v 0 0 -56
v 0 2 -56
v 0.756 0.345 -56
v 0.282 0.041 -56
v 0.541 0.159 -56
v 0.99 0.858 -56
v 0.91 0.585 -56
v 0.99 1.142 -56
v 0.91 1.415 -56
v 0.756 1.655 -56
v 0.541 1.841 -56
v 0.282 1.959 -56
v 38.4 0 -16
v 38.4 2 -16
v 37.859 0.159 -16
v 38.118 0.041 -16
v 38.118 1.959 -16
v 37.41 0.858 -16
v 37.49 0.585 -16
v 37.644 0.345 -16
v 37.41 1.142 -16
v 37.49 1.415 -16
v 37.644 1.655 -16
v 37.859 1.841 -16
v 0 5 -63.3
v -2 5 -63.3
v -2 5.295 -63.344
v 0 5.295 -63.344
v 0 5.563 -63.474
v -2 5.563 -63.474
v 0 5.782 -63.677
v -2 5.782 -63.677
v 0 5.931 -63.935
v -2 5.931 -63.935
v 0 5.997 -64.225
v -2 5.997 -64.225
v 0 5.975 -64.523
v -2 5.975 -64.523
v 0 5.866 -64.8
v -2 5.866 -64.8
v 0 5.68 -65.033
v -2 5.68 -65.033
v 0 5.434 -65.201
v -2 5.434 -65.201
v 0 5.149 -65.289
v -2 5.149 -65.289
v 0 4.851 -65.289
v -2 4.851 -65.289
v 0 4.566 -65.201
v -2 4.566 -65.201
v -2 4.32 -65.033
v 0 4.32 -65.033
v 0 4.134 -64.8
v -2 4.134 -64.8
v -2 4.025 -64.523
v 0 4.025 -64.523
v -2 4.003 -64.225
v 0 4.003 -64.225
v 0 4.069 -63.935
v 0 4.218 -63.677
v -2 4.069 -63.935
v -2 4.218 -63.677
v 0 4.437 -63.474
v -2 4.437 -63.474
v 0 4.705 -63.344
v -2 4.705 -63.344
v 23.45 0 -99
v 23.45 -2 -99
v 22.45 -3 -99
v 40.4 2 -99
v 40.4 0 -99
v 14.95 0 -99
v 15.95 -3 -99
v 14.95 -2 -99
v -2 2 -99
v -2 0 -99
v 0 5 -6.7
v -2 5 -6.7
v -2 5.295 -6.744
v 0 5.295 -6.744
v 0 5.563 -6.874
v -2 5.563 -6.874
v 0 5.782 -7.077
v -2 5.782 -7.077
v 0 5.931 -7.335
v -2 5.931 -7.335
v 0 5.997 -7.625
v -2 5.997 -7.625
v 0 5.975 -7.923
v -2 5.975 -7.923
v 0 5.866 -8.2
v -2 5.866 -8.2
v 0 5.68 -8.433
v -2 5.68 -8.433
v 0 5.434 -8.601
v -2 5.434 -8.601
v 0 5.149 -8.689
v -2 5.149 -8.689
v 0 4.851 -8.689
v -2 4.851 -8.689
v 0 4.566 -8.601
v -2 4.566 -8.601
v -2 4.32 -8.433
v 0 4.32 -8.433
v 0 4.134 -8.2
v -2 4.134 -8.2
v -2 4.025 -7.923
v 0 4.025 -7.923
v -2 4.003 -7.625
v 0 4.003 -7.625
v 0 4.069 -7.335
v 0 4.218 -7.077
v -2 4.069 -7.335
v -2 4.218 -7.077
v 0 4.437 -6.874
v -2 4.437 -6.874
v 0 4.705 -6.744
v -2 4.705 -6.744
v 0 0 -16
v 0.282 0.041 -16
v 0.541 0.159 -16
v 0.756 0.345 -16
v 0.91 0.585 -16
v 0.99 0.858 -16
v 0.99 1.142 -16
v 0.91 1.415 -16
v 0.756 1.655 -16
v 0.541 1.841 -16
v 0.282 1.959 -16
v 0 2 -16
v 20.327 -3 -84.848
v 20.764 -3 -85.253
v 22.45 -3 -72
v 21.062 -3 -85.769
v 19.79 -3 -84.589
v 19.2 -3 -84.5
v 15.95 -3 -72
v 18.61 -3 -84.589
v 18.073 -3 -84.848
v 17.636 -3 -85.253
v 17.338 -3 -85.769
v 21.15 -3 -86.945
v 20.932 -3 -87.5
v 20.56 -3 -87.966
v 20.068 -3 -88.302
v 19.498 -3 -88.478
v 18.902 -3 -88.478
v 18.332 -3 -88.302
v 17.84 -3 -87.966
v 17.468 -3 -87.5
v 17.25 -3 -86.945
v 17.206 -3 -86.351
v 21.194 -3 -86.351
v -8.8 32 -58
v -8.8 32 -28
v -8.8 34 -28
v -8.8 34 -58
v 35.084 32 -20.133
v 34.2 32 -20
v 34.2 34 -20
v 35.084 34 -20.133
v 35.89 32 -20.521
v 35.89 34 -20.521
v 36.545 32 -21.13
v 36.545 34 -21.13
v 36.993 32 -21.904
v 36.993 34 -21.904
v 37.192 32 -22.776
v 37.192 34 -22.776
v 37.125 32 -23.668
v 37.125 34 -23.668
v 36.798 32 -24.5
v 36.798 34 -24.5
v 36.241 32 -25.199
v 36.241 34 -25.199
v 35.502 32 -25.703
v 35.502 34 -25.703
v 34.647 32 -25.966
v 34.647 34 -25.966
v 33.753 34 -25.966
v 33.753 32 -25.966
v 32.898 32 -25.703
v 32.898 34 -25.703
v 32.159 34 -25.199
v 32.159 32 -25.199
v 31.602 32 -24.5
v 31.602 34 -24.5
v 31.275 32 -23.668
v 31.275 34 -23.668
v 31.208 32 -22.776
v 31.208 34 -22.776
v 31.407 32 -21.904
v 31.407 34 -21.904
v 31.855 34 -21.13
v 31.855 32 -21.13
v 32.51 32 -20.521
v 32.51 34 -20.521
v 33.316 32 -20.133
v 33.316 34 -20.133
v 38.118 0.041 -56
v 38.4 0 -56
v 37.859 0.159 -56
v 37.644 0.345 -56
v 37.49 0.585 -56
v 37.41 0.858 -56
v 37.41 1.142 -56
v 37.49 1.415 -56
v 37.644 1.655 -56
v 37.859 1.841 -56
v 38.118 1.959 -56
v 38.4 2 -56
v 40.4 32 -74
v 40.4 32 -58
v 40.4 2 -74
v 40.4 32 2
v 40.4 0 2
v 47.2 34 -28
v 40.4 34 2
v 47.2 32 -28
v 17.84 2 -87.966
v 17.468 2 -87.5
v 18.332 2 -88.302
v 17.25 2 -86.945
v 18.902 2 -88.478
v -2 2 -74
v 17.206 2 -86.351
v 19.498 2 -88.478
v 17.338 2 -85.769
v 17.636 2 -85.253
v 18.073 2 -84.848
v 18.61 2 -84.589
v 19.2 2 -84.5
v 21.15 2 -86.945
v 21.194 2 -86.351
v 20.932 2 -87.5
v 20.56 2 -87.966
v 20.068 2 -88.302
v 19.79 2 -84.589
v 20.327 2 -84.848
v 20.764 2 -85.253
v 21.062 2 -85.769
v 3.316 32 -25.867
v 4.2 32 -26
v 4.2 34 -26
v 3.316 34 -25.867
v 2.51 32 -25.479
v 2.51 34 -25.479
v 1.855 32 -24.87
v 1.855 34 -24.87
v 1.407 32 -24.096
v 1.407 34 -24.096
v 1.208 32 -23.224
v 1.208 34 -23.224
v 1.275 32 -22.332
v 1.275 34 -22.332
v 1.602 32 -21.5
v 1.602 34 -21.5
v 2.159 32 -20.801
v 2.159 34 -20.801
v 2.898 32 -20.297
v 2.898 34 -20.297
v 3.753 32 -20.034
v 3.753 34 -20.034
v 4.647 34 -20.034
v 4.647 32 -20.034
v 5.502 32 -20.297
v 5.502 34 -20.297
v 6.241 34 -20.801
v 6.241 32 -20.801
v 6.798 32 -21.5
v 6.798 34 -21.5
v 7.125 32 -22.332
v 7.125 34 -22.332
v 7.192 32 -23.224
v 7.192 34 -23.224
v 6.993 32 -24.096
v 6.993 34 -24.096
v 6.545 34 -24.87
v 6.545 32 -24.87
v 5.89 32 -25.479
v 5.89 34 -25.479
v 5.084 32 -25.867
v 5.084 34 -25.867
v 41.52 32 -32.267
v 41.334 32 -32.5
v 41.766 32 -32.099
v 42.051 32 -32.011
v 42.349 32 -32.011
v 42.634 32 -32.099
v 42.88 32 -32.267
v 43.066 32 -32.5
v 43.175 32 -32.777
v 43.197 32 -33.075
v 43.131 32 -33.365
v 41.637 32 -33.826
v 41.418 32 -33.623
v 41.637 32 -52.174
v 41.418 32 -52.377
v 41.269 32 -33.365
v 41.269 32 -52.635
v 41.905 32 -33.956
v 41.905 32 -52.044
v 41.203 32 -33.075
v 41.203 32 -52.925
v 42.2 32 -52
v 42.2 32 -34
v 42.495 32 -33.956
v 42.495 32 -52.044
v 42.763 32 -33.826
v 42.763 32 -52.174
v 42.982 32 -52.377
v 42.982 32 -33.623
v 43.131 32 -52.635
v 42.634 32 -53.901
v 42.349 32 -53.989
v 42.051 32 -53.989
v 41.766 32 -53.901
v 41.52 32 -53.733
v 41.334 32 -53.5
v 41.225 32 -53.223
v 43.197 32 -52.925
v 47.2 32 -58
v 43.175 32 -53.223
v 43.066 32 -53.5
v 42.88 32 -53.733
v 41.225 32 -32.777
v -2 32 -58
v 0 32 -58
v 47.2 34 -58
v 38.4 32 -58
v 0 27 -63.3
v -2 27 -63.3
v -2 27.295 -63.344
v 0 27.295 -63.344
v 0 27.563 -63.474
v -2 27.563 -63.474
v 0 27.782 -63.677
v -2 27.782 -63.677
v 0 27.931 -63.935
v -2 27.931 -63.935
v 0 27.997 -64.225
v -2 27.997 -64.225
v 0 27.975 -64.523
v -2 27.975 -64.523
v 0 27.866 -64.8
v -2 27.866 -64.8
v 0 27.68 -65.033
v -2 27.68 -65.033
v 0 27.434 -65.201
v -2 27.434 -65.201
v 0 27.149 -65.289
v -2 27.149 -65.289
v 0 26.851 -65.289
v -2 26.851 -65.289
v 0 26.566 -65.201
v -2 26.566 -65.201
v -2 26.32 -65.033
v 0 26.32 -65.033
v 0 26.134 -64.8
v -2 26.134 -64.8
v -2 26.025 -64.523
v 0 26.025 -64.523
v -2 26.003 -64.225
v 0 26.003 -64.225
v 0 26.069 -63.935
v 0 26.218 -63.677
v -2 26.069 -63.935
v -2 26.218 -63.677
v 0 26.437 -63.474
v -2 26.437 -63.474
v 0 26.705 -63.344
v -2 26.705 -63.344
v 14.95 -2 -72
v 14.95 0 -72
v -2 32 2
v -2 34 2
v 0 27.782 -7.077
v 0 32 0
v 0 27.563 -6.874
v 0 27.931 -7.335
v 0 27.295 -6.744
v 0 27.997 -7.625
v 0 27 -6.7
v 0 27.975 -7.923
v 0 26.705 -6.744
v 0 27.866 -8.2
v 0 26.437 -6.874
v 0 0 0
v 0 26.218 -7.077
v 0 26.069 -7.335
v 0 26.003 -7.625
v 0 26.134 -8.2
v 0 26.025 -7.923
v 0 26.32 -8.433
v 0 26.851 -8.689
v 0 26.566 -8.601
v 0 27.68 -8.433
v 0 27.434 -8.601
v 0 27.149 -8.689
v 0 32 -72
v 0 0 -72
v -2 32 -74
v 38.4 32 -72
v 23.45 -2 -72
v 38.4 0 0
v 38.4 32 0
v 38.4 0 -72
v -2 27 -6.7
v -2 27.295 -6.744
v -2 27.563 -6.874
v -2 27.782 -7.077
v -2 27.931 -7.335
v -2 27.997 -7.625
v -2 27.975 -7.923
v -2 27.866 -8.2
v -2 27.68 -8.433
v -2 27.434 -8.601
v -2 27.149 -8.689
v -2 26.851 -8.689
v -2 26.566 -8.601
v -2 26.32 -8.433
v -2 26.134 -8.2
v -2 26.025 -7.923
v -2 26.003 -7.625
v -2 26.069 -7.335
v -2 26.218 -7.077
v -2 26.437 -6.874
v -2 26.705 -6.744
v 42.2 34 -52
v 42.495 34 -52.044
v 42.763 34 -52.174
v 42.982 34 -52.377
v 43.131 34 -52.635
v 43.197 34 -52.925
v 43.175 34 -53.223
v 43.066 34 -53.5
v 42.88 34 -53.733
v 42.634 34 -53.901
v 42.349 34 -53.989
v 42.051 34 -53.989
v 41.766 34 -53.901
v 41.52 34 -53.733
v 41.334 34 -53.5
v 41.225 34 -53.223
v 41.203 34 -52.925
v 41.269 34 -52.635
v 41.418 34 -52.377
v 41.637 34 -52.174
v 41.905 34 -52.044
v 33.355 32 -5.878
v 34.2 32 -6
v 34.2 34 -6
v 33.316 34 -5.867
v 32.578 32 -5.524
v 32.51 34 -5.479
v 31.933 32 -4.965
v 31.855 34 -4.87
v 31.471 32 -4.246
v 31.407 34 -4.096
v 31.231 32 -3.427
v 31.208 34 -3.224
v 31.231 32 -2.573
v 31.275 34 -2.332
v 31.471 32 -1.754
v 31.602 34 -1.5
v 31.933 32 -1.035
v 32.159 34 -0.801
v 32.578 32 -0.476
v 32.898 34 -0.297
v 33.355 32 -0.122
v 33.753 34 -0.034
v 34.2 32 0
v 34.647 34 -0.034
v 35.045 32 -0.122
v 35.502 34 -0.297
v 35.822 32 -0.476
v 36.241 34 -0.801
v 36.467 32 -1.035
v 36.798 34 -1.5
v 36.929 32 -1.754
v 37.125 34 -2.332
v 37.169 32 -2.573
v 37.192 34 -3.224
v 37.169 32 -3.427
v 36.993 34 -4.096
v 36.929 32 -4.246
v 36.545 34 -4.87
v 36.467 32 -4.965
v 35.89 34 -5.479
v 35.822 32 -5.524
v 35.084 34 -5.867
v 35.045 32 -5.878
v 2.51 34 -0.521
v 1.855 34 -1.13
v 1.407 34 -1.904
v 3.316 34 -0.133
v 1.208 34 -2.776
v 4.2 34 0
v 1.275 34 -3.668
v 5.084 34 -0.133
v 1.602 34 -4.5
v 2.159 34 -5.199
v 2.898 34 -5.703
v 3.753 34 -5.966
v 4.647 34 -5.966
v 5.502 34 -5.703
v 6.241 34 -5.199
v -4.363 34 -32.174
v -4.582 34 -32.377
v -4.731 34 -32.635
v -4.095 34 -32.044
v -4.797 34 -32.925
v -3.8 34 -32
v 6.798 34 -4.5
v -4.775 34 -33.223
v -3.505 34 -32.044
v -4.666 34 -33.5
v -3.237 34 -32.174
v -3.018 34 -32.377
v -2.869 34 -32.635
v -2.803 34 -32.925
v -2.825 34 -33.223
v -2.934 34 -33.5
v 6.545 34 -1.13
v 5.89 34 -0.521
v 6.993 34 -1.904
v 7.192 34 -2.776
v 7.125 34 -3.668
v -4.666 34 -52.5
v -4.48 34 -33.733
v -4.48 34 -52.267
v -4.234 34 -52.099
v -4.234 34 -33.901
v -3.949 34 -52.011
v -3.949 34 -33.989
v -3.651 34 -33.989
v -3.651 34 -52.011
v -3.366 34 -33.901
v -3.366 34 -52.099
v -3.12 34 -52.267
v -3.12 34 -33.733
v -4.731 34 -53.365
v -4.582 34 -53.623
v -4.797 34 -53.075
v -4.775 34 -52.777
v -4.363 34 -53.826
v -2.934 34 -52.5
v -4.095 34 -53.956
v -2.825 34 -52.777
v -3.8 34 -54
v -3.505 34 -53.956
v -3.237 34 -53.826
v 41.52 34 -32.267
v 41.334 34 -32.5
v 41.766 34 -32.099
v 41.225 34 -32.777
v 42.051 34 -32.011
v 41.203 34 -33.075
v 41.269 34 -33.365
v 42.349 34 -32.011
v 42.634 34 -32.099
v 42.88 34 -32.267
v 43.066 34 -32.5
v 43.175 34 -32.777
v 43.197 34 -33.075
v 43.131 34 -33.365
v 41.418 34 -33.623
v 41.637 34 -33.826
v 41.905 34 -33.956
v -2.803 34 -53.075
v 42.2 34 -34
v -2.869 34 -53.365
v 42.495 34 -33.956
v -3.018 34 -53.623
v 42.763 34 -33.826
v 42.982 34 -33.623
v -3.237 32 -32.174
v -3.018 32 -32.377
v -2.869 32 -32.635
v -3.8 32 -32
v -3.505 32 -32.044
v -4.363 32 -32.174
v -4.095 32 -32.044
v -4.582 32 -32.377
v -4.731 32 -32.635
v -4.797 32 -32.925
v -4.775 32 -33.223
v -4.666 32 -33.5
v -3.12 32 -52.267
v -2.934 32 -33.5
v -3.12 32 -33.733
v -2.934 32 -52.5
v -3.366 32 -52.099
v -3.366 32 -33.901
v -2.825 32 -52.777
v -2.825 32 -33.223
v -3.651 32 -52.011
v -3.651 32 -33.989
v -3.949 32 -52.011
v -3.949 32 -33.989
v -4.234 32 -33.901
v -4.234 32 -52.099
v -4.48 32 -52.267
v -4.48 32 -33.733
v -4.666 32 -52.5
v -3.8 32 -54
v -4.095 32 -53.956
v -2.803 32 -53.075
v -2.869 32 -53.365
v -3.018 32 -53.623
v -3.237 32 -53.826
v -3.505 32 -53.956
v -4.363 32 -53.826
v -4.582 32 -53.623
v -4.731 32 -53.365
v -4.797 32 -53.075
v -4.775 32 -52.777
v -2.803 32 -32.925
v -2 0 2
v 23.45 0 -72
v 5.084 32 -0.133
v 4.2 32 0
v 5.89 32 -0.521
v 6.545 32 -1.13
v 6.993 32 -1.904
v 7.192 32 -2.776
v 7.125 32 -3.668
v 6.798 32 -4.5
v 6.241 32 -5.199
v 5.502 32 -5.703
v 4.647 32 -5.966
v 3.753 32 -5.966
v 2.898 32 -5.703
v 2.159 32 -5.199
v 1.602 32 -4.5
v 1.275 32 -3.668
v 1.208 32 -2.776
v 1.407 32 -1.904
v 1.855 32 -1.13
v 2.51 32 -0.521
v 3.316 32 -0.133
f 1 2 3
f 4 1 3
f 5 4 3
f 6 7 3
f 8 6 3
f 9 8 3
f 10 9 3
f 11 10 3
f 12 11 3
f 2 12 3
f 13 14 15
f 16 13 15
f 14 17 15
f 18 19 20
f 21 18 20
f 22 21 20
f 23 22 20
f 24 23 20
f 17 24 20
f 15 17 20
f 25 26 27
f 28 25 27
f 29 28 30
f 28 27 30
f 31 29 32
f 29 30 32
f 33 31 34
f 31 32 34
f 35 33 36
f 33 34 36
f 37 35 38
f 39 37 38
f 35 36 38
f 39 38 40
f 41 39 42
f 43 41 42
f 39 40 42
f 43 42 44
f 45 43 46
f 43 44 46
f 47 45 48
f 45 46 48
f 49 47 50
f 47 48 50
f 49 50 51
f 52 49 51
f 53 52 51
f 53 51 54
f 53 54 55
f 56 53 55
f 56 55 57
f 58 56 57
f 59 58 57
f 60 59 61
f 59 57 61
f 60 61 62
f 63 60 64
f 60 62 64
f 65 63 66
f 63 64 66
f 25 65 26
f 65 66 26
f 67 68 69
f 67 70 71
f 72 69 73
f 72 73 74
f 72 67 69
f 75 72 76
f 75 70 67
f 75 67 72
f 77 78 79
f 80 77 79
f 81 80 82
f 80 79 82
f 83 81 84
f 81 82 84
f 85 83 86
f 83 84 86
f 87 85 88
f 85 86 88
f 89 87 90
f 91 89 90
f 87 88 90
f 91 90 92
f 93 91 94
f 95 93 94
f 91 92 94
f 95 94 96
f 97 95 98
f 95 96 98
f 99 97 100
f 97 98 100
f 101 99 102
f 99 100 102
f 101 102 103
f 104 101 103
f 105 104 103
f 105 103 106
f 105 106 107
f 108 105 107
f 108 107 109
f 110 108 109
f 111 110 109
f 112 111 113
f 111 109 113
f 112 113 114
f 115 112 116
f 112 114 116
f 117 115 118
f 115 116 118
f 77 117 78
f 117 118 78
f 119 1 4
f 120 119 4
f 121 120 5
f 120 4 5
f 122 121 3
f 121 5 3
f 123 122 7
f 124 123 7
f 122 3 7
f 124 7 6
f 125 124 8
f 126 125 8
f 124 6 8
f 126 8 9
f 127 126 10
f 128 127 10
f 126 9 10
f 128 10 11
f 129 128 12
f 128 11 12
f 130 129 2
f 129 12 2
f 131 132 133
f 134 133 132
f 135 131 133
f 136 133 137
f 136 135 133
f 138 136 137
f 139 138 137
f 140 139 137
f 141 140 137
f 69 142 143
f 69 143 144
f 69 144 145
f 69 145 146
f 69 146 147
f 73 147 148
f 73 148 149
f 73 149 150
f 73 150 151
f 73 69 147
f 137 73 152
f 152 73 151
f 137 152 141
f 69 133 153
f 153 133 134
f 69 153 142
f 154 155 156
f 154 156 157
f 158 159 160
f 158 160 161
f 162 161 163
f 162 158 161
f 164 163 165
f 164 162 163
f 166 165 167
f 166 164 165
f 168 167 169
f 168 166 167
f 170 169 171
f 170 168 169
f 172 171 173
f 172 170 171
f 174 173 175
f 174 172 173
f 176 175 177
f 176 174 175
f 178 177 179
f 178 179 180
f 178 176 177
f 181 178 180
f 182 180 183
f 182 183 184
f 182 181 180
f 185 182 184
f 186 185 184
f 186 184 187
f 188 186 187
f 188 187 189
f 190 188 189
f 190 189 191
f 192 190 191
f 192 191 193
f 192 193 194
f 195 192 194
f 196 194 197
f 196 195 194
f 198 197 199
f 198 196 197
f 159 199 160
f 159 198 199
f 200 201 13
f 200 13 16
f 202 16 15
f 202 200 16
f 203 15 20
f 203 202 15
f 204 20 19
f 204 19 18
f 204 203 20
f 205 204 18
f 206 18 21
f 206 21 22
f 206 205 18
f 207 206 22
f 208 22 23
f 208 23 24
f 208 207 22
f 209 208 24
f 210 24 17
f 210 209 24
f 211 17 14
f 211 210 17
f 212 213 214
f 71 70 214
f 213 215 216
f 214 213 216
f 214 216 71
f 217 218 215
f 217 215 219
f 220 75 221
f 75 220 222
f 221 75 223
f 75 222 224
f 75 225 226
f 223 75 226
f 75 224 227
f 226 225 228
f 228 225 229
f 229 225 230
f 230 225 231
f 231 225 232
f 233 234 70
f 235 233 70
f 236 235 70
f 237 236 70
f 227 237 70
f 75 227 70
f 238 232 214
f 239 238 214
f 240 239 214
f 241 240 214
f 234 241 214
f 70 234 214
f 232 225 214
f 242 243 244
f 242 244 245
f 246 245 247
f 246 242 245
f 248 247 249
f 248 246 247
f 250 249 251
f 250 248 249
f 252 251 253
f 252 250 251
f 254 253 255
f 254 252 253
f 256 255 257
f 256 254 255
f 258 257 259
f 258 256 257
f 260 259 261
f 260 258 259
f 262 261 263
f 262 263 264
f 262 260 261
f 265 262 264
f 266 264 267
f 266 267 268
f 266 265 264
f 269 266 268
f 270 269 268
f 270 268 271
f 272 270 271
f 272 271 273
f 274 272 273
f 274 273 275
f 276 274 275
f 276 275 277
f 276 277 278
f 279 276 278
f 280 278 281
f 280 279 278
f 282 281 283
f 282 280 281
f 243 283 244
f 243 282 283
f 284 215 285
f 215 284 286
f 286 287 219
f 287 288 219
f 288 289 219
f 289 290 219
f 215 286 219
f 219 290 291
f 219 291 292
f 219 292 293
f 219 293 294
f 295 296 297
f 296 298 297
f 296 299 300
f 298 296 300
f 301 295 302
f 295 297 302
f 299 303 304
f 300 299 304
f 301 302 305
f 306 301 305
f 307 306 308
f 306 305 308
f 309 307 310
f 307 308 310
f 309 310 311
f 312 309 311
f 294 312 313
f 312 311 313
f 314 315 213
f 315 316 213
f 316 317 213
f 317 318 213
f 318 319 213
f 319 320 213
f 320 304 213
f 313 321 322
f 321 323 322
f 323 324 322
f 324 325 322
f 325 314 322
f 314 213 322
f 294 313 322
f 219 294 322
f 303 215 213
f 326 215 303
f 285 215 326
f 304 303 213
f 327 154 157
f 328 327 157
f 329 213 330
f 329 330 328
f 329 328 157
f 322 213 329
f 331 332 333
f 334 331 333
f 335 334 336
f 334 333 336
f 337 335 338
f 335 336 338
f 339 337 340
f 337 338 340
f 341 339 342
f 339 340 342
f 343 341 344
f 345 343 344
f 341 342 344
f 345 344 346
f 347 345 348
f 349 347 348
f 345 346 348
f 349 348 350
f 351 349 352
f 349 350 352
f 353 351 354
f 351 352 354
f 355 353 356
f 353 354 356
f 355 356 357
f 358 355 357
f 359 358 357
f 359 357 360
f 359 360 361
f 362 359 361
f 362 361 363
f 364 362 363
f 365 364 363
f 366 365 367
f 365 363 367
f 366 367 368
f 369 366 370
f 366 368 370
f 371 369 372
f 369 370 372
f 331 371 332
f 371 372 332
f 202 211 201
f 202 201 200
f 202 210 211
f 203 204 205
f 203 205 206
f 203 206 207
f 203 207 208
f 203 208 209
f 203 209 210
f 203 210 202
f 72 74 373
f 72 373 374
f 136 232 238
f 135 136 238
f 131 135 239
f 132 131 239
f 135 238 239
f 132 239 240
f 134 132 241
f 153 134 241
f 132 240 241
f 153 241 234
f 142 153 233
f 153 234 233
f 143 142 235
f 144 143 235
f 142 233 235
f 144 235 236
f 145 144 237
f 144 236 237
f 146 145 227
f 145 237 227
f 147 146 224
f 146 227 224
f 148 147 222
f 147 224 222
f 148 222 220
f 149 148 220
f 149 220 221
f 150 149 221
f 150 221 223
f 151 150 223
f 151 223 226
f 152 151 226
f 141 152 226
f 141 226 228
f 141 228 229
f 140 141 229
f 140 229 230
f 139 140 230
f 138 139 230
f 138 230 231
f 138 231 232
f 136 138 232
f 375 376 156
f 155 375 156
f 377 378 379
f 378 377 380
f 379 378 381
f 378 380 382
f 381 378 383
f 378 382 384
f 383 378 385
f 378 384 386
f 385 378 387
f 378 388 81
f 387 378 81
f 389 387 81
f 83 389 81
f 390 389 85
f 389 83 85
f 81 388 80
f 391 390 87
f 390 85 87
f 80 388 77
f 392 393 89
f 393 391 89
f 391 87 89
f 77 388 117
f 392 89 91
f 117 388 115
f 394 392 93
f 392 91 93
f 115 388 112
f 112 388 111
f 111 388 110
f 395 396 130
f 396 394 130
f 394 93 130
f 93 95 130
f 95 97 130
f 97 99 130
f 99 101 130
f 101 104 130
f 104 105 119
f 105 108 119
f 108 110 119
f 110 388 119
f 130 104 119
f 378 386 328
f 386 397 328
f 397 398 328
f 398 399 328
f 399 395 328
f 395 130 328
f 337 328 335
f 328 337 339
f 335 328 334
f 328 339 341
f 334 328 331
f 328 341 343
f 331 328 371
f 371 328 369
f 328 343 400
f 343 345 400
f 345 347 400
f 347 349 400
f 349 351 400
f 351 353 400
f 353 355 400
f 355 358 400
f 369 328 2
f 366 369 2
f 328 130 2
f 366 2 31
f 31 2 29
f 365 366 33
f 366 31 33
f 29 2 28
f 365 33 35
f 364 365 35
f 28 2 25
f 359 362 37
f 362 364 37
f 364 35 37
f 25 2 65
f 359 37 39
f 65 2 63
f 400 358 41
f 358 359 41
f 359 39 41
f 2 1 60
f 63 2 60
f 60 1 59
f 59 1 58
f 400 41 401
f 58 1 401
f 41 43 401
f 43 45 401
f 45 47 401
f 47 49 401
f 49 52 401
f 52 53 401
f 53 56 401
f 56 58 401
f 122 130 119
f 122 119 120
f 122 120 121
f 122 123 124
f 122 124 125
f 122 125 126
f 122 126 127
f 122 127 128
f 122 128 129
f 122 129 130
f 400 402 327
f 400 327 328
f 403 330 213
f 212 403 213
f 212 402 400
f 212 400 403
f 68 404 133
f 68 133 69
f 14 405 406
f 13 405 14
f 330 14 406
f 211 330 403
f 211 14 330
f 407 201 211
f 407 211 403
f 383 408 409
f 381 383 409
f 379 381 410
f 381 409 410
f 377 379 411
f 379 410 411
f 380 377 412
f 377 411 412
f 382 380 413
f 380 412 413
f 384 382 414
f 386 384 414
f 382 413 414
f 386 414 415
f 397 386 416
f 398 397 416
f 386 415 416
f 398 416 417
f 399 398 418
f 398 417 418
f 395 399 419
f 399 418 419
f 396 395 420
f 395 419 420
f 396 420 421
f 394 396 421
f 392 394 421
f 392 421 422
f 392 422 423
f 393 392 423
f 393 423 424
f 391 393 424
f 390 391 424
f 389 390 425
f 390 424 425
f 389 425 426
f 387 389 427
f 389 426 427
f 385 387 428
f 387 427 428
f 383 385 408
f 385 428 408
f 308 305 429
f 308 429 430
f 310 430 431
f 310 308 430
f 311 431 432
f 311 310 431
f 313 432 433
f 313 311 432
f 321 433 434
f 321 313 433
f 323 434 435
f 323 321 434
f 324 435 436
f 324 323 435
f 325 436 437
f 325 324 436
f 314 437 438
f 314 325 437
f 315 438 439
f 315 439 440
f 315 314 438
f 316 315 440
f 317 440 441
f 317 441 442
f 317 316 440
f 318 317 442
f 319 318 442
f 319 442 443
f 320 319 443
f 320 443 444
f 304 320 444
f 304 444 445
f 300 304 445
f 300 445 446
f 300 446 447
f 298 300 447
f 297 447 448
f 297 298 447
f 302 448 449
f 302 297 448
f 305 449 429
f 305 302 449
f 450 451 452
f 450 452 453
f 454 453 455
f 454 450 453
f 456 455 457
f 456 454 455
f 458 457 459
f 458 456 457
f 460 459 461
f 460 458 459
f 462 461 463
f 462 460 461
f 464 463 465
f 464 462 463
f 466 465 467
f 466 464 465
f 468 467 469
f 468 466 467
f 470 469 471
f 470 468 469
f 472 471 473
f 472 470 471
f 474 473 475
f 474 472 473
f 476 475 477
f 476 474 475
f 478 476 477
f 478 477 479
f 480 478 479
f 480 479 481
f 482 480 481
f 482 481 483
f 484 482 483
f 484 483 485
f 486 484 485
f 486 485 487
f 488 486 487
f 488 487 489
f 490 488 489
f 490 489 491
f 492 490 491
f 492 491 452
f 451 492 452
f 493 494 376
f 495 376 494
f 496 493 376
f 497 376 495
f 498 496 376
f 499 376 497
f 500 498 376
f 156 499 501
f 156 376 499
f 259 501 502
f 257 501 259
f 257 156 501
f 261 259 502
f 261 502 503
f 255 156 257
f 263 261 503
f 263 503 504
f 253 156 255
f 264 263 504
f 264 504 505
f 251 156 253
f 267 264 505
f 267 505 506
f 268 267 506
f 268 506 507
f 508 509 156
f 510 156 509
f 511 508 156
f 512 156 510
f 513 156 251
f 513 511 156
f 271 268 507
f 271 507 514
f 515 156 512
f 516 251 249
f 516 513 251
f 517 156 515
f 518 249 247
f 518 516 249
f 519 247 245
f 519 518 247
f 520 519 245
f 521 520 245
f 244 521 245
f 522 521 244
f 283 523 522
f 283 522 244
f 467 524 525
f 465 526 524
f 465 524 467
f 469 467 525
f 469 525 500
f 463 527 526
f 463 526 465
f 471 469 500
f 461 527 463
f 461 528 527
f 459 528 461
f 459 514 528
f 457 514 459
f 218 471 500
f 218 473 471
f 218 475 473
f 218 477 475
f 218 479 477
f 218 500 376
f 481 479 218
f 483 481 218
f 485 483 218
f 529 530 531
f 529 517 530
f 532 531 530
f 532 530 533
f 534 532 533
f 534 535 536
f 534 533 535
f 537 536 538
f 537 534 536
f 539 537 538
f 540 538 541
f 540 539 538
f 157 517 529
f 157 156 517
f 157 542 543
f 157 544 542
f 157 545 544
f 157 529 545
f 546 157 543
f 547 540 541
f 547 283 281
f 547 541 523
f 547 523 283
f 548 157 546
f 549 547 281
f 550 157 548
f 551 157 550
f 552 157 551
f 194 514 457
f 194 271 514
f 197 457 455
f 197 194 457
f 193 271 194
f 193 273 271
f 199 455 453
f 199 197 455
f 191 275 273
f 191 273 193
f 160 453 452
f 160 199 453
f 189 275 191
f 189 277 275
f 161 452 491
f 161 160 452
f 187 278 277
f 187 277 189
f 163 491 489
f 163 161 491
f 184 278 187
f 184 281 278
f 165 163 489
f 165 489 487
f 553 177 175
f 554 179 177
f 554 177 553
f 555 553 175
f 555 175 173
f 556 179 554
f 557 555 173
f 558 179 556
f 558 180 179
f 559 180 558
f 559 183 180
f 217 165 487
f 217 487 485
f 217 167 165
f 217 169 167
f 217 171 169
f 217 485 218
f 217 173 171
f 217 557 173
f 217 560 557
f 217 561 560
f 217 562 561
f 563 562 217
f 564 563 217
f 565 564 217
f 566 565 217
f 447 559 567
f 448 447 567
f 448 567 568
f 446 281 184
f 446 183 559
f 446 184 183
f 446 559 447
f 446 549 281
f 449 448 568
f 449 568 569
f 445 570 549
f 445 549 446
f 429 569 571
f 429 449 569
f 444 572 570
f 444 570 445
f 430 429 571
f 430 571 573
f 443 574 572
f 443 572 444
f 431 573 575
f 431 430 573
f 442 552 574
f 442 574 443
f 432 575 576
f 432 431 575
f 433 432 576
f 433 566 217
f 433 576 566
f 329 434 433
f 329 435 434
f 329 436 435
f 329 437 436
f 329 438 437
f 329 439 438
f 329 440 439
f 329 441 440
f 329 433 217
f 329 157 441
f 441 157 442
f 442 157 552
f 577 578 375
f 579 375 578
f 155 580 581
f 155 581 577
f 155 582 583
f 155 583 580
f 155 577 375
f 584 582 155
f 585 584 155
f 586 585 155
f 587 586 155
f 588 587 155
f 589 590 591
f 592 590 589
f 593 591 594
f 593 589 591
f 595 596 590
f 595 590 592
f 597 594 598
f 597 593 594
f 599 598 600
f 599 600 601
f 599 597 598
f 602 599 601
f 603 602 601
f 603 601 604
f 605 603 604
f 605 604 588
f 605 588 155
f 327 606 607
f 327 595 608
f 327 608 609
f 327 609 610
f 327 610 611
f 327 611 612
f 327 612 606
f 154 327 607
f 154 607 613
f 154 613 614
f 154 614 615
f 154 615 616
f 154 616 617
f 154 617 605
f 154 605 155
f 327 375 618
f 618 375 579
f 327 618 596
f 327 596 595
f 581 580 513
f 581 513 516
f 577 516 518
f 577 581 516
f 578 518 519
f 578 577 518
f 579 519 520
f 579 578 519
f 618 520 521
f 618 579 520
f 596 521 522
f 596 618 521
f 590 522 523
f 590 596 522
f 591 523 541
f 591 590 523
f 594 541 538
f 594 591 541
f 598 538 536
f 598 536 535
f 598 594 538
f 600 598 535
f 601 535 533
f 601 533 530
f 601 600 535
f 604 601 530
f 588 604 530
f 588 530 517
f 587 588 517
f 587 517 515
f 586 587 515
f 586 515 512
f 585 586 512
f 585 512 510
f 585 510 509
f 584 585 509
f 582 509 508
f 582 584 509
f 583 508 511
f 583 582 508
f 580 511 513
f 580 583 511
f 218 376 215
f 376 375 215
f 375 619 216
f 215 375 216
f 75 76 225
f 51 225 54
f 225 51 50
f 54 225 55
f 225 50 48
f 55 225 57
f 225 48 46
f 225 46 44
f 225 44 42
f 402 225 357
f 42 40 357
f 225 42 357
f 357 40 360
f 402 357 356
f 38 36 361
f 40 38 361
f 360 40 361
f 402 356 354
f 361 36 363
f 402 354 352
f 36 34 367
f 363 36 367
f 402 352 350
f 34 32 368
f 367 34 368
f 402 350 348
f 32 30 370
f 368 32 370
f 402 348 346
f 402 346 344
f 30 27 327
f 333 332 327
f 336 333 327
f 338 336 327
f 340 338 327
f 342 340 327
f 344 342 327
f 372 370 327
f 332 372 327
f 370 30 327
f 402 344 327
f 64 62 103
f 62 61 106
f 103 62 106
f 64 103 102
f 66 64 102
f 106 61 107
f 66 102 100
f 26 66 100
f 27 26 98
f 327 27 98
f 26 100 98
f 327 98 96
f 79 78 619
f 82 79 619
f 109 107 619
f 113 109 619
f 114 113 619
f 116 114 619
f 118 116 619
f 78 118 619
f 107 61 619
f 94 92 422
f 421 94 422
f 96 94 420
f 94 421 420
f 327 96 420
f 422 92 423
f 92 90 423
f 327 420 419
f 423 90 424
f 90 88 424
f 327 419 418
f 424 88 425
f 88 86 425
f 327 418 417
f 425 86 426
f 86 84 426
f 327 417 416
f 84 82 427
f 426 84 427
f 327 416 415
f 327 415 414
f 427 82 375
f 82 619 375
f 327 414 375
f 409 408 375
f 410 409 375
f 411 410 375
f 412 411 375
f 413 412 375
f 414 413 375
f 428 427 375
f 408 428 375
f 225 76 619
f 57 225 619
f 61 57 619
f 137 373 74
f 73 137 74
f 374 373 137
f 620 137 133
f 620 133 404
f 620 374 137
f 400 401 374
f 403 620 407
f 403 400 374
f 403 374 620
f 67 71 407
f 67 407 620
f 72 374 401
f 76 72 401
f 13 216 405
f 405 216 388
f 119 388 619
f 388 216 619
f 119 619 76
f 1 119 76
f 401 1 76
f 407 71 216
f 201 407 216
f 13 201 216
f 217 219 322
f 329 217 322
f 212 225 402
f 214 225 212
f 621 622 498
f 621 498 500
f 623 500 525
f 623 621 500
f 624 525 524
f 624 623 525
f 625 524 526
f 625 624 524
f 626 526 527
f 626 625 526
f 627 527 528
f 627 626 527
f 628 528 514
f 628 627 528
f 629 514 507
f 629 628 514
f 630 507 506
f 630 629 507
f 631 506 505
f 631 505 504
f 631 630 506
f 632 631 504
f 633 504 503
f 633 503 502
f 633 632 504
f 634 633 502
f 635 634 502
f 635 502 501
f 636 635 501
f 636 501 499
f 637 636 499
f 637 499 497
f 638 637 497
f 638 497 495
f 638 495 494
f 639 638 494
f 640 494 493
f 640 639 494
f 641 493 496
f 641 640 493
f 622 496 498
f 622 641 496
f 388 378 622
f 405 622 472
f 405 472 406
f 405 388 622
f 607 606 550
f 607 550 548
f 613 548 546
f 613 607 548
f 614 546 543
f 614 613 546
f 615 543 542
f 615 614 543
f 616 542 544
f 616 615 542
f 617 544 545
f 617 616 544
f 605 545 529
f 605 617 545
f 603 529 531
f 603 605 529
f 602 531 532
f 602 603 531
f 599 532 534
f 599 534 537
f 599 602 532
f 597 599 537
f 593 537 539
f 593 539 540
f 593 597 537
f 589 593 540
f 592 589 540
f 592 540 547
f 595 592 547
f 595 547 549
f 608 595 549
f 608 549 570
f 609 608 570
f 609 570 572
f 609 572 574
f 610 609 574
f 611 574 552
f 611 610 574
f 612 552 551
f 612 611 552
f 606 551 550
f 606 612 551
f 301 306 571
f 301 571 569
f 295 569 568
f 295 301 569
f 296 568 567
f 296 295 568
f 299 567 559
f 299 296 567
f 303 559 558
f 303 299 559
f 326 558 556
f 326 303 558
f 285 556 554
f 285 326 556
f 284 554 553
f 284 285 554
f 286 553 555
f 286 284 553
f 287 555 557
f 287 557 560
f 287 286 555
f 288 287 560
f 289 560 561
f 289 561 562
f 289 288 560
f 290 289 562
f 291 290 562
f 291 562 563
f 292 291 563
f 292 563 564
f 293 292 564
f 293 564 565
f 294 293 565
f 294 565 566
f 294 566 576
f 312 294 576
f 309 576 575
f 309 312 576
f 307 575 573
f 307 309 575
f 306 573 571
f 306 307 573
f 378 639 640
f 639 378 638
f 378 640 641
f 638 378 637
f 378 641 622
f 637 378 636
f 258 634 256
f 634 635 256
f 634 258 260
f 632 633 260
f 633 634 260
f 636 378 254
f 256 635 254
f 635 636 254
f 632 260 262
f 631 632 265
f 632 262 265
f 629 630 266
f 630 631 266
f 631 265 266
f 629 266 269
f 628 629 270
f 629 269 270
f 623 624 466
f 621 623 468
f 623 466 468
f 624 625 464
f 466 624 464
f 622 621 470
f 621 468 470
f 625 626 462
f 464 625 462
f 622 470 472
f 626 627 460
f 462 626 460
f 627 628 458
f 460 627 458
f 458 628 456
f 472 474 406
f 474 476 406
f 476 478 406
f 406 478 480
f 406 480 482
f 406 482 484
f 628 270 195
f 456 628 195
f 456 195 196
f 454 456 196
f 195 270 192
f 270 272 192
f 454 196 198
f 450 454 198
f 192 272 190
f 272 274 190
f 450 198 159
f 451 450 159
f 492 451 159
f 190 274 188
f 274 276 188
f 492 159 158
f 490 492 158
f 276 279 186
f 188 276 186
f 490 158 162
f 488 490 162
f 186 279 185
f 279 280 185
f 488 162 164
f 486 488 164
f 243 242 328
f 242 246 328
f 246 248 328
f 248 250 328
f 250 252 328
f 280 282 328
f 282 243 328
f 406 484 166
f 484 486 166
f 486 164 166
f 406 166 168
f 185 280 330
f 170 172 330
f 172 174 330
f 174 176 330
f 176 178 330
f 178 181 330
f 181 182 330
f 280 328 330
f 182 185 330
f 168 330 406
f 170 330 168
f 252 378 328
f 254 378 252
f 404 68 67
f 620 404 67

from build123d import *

# Parameters (mm, degrees)
SKETCH2_W                       = 42.4
SKETCH2_H                       = 76
SKETCH2_W_2                     = 38.4
SKETCH2_H_2                     = 72
BOSS_EXTRUDE4_DEPTH             = 32
SKETCH1_W                       = 42.4
SKETCH1_H                       = 30
SKETCH1_R                       = 3
BOSS_EXTRUDE1_DEPTH             = 2
SKETCH4_W                       = 56
SKETCH4_H                       = 30
SKETCH4_R                       = 1
BOSS_EXTRUDE5_DEPTH             = 2
SKETCH5_R                       = 1
CUT_EXTRUDE1_DEPTH              = 2
SKETCH9_W                       = 20
SKETCH9_H                       = 1
SKETCH11_W                      = 4.25
SKETCH11_H                      = 3
BOSS_EXTRUDE7_DEPTH             = 25
BOSS_EXTRUDE7_DIRECTION_2_REACH = 97.707
SKETCH12_R                      = 2
CUT_EXTRUDE2_DEPTH              = 25
CHAMFER1_SIZE                   = 1
BOSS_EXTRUDE8_DEPTH             = 2


with BuildPart() as part:
    # Sketch2 → Boss-Extrude4 (new body)
    with BuildSketch(Plane(origin=(0, 0, 0), x_dir=(1, 0, 0), z_dir=(0, 1, 0))):
        with Locations((19.2, 36)):
            Rectangle(SKETCH2_W, SKETCH2_H)
        with Locations((19.2, 36)):
            Rectangle(SKETCH2_W_2, SKETCH2_H_2, mode=Mode.SUBTRACT)
    extrude(amount=BOSS_EXTRUDE4_DEPTH)



with BuildPart() as body_2:
    # Sketch1 → Boss-Extrude1 (new body)
    with BuildSketch(Plane(origin=(0, 32, 0), x_dir=(1, 0, 0), z_dir=(0, 1, 0))):
        with Locations((19.2, 13)):
            Rectangle(SKETCH1_W, SKETCH1_H)
        with Locations(Location((4.2, 3, 0), (0, 0, 270))):
            Circle(SKETCH1_R, mode=Mode.SUBTRACT)
        with Locations(Location((34.2, 3, 0), (0, 0, 90))):
            Circle(SKETCH1_R, mode=Mode.SUBTRACT)
        with Locations(Location((34.2, 23, 0), (0, 0, 270))):
            Circle(SKETCH1_R, mode=Mode.SUBTRACT)
        with Locations(Location((4.2, 23, 0), (0, 0, 90))):
            Circle(SKETCH1_R, mode=Mode.SUBTRACT)
    extrude(amount=BOSS_EXTRUDE1_DEPTH)


with BuildPart() as part_1:
    add(part.part)

    add(body_2.part)  # Boss-Extrude5 merges body 2
    # Sketch4 → Boss-Extrude5 (add)
    with BuildSketch(Plane(origin=(0, 32, 0), x_dir=(1, 0, 0), z_dir=(0, 1, 0))):
        with Locations((19.2, 43)):
            Rectangle(SKETCH4_W, SKETCH4_H)
        with Locations(Location((-3.8, 33, 0), (0, 0, 270))):
            Circle(SKETCH4_R, mode=Mode.SUBTRACT)
        with Locations(Location((-3.8, 53, 0), (0, 0, 90))):
            Circle(SKETCH4_R, mode=Mode.SUBTRACT)
        with Locations(Location((42.2, 53, 0), (0, 0, 270))):
            Circle(SKETCH4_R, mode=Mode.SUBTRACT)
        with Locations(Location((42.2, 33, 0), (0, 0, 90))):
            Circle(SKETCH4_R, mode=Mode.SUBTRACT)
    extrude(amount=BOSS_EXTRUDE5_DEPTH)

    # Sketch5 → Cut-Extrude1 (cut)
    with BuildSketch(Plane.ZY.offset(2)):
        with Locations((-7.7, 5)):
            Circle(SKETCH5_R)
        with Locations((-7.7, 27)):
            Circle(SKETCH5_R)
        with Locations((-64.3, 27)):
            Circle(SKETCH5_R)
        with Locations((-64.3, 5)):
            Circle(SKETCH5_R)
    extrude(amount=-CUT_EXTRUDE1_DEPTH, mode=Mode.SUBTRACT)

    # Sketch9 → Revolve1 (revolve)
    with BuildSketch(Plane(origin=(0, 0, 0), x_dir=(0, 0, -1), z_dir=(1, 0, 0))):
        with Locations((46, 0.5)):
            Rectangle(SKETCH9_W, SKETCH9_H)
        with Locations((26, 0.5)):
            Rectangle(SKETCH9_W, SKETCH9_H)
    revolve1 = revolve(axis=Axis((0, 1, -56), (0, 0, 1)))

    # Mirror1: Revolve1 across plane
    add(revolve1.mirror(Plane(origin=(19.2, 0, 0), x_dir=(0, 0, 1), z_dir=(1, 0, 0))))

    # Sketch11 → Boss-Extrude7 (add)
    with BuildSketch(Plane(origin=(0, 0, -74), x_dir=(-1, 0, 0), z_dir=(0, 0, -1))):
        Polygon((-14.95, 0), (2, 0), (2, 2), (-40.4, 2), (-40.4, 0), (-23.45, 0), (-19.2, 0), align=None)
        with Locations((-21.325, -1.5)):
            Rectangle(SKETCH11_W, SKETCH11_H)
        with Locations((-17.075, -1.5)):
            Rectangle(SKETCH11_W, SKETCH11_H)
    extrude(amount=BOSS_EXTRUDE7_DEPTH)

    # Boss-Extrude7 direction 2: up to this face of the body (flat: up to its plane)
    boss_extrude7_direction_2_end = Plane(part_1.part.faces().sort_by_distance((19.2, 16, -72))[0])
    # Sketch11 → Boss-Extrude7 direction 2 (add, up to the picked face)
    with BuildSketch(Plane(origin=(0, 0, -74), x_dir=(-1, 0, 0), z_dir=(0, 0, -1)), mode=Mode.PRIVATE) as boss_extrude7_direction_2_sk1:
        Polygon((-14.95, 0), (2, 0), (2, 2), (-40.4, 2), (-40.4, 0), (-23.45, 0), (-19.2, 0), align=None)
    boss_extrude7_direction_2_tool1 = split(extrude(boss_extrude7_direction_2_sk1.sketch, amount=-BOSS_EXTRUDE7_DIRECTION_2_REACH, mode=Mode.PRIVATE), bisect_by=boss_extrude7_direction_2_end, keep=Keep.BOTH, mode=Mode.PRIVATE)
    # Sketch11 → Boss-Extrude7 direction 2 (add, up to the picked face)
    with BuildSketch(Plane(origin=(0, 0, -74), x_dir=(-1, 0, 0), z_dir=(0, 0, -1)), mode=Mode.PRIVATE) as boss_extrude7_direction_2_sk2:
        with Locations((-21.325, -1.5)):
            Rectangle(SKETCH11_W, SKETCH11_H)
    boss_extrude7_direction_2_tool2 = split(extrude(boss_extrude7_direction_2_sk2.sketch, amount=-BOSS_EXTRUDE7_DIRECTION_2_REACH, mode=Mode.PRIVATE), bisect_by=boss_extrude7_direction_2_end, keep=Keep.BOTH, mode=Mode.PRIVATE)
    # Sketch11 → Boss-Extrude7 direction 2 (add, up to the picked face)
    with BuildSketch(Plane(origin=(0, 0, -74), x_dir=(-1, 0, 0), z_dir=(0, 0, -1)), mode=Mode.PRIVATE) as boss_extrude7_direction_2_sk3:
        with Locations((-17.075, -1.5)):
            Rectangle(SKETCH11_W, SKETCH11_H)
    boss_extrude7_direction_2_tool3 = split(extrude(boss_extrude7_direction_2_sk3.sketch, amount=-BOSS_EXTRUDE7_DIRECTION_2_REACH, mode=Mode.PRIVATE), bisect_by=boss_extrude7_direction_2_end, keep=Keep.BOTH, mode=Mode.PRIVATE)
    add(boss_extrude7_direction_2_tool1.solids().sort_by(Axis((19.2, 1, -74), (0, 0, 1)))[0])
    add(boss_extrude7_direction_2_tool2.solids().sort_by(Axis((21.325, -1.5, -74), (0, 0, 1)))[0])
    add(boss_extrude7_direction_2_tool3.solids().sort_by(Axis((17.075, -1.5, -74), (0, 0, 1)))[0])

    # Sketch12 → Cut-Extrude2 (cut)
    with BuildSketch(Plane(origin=(0, 2, 0), x_dir=(1, 0, 0), z_dir=(0, 1, 0))):
        with Locations(Location((19.2, 86.5, 0), (0, 0, 270))):
            Circle(SKETCH12_R)
    extrude(amount=-CUT_EXTRUDE2_DEPTH, mode=Mode.SUBTRACT)

    # Chamfer1
    chamfer1_edges = [part_1.edges().sort_by_distance(p)[0] for p in [
        (23.45, -3, -85.5),
        (14.95, -3, -85.5),
    ]]
    chamfer(chamfer1_edges, length=CHAMFER1_SIZE)

    # Sketch13 → Boss-Extrude8 (add)
    with BuildSketch(Plane(origin=(0, 34, 0), x_dir=(1, 0, 0), z_dir=(0, 1, 0))):
        Polygon((40.4, -2), (47.2, 28), (40.4, 28), align=None)
        Polygon((-8.8, 28), (-2, 28), (-2, -2), align=None)
    extrude(amount=-BOSS_EXTRUDE8_DEPTH)


solid = part_1.part
